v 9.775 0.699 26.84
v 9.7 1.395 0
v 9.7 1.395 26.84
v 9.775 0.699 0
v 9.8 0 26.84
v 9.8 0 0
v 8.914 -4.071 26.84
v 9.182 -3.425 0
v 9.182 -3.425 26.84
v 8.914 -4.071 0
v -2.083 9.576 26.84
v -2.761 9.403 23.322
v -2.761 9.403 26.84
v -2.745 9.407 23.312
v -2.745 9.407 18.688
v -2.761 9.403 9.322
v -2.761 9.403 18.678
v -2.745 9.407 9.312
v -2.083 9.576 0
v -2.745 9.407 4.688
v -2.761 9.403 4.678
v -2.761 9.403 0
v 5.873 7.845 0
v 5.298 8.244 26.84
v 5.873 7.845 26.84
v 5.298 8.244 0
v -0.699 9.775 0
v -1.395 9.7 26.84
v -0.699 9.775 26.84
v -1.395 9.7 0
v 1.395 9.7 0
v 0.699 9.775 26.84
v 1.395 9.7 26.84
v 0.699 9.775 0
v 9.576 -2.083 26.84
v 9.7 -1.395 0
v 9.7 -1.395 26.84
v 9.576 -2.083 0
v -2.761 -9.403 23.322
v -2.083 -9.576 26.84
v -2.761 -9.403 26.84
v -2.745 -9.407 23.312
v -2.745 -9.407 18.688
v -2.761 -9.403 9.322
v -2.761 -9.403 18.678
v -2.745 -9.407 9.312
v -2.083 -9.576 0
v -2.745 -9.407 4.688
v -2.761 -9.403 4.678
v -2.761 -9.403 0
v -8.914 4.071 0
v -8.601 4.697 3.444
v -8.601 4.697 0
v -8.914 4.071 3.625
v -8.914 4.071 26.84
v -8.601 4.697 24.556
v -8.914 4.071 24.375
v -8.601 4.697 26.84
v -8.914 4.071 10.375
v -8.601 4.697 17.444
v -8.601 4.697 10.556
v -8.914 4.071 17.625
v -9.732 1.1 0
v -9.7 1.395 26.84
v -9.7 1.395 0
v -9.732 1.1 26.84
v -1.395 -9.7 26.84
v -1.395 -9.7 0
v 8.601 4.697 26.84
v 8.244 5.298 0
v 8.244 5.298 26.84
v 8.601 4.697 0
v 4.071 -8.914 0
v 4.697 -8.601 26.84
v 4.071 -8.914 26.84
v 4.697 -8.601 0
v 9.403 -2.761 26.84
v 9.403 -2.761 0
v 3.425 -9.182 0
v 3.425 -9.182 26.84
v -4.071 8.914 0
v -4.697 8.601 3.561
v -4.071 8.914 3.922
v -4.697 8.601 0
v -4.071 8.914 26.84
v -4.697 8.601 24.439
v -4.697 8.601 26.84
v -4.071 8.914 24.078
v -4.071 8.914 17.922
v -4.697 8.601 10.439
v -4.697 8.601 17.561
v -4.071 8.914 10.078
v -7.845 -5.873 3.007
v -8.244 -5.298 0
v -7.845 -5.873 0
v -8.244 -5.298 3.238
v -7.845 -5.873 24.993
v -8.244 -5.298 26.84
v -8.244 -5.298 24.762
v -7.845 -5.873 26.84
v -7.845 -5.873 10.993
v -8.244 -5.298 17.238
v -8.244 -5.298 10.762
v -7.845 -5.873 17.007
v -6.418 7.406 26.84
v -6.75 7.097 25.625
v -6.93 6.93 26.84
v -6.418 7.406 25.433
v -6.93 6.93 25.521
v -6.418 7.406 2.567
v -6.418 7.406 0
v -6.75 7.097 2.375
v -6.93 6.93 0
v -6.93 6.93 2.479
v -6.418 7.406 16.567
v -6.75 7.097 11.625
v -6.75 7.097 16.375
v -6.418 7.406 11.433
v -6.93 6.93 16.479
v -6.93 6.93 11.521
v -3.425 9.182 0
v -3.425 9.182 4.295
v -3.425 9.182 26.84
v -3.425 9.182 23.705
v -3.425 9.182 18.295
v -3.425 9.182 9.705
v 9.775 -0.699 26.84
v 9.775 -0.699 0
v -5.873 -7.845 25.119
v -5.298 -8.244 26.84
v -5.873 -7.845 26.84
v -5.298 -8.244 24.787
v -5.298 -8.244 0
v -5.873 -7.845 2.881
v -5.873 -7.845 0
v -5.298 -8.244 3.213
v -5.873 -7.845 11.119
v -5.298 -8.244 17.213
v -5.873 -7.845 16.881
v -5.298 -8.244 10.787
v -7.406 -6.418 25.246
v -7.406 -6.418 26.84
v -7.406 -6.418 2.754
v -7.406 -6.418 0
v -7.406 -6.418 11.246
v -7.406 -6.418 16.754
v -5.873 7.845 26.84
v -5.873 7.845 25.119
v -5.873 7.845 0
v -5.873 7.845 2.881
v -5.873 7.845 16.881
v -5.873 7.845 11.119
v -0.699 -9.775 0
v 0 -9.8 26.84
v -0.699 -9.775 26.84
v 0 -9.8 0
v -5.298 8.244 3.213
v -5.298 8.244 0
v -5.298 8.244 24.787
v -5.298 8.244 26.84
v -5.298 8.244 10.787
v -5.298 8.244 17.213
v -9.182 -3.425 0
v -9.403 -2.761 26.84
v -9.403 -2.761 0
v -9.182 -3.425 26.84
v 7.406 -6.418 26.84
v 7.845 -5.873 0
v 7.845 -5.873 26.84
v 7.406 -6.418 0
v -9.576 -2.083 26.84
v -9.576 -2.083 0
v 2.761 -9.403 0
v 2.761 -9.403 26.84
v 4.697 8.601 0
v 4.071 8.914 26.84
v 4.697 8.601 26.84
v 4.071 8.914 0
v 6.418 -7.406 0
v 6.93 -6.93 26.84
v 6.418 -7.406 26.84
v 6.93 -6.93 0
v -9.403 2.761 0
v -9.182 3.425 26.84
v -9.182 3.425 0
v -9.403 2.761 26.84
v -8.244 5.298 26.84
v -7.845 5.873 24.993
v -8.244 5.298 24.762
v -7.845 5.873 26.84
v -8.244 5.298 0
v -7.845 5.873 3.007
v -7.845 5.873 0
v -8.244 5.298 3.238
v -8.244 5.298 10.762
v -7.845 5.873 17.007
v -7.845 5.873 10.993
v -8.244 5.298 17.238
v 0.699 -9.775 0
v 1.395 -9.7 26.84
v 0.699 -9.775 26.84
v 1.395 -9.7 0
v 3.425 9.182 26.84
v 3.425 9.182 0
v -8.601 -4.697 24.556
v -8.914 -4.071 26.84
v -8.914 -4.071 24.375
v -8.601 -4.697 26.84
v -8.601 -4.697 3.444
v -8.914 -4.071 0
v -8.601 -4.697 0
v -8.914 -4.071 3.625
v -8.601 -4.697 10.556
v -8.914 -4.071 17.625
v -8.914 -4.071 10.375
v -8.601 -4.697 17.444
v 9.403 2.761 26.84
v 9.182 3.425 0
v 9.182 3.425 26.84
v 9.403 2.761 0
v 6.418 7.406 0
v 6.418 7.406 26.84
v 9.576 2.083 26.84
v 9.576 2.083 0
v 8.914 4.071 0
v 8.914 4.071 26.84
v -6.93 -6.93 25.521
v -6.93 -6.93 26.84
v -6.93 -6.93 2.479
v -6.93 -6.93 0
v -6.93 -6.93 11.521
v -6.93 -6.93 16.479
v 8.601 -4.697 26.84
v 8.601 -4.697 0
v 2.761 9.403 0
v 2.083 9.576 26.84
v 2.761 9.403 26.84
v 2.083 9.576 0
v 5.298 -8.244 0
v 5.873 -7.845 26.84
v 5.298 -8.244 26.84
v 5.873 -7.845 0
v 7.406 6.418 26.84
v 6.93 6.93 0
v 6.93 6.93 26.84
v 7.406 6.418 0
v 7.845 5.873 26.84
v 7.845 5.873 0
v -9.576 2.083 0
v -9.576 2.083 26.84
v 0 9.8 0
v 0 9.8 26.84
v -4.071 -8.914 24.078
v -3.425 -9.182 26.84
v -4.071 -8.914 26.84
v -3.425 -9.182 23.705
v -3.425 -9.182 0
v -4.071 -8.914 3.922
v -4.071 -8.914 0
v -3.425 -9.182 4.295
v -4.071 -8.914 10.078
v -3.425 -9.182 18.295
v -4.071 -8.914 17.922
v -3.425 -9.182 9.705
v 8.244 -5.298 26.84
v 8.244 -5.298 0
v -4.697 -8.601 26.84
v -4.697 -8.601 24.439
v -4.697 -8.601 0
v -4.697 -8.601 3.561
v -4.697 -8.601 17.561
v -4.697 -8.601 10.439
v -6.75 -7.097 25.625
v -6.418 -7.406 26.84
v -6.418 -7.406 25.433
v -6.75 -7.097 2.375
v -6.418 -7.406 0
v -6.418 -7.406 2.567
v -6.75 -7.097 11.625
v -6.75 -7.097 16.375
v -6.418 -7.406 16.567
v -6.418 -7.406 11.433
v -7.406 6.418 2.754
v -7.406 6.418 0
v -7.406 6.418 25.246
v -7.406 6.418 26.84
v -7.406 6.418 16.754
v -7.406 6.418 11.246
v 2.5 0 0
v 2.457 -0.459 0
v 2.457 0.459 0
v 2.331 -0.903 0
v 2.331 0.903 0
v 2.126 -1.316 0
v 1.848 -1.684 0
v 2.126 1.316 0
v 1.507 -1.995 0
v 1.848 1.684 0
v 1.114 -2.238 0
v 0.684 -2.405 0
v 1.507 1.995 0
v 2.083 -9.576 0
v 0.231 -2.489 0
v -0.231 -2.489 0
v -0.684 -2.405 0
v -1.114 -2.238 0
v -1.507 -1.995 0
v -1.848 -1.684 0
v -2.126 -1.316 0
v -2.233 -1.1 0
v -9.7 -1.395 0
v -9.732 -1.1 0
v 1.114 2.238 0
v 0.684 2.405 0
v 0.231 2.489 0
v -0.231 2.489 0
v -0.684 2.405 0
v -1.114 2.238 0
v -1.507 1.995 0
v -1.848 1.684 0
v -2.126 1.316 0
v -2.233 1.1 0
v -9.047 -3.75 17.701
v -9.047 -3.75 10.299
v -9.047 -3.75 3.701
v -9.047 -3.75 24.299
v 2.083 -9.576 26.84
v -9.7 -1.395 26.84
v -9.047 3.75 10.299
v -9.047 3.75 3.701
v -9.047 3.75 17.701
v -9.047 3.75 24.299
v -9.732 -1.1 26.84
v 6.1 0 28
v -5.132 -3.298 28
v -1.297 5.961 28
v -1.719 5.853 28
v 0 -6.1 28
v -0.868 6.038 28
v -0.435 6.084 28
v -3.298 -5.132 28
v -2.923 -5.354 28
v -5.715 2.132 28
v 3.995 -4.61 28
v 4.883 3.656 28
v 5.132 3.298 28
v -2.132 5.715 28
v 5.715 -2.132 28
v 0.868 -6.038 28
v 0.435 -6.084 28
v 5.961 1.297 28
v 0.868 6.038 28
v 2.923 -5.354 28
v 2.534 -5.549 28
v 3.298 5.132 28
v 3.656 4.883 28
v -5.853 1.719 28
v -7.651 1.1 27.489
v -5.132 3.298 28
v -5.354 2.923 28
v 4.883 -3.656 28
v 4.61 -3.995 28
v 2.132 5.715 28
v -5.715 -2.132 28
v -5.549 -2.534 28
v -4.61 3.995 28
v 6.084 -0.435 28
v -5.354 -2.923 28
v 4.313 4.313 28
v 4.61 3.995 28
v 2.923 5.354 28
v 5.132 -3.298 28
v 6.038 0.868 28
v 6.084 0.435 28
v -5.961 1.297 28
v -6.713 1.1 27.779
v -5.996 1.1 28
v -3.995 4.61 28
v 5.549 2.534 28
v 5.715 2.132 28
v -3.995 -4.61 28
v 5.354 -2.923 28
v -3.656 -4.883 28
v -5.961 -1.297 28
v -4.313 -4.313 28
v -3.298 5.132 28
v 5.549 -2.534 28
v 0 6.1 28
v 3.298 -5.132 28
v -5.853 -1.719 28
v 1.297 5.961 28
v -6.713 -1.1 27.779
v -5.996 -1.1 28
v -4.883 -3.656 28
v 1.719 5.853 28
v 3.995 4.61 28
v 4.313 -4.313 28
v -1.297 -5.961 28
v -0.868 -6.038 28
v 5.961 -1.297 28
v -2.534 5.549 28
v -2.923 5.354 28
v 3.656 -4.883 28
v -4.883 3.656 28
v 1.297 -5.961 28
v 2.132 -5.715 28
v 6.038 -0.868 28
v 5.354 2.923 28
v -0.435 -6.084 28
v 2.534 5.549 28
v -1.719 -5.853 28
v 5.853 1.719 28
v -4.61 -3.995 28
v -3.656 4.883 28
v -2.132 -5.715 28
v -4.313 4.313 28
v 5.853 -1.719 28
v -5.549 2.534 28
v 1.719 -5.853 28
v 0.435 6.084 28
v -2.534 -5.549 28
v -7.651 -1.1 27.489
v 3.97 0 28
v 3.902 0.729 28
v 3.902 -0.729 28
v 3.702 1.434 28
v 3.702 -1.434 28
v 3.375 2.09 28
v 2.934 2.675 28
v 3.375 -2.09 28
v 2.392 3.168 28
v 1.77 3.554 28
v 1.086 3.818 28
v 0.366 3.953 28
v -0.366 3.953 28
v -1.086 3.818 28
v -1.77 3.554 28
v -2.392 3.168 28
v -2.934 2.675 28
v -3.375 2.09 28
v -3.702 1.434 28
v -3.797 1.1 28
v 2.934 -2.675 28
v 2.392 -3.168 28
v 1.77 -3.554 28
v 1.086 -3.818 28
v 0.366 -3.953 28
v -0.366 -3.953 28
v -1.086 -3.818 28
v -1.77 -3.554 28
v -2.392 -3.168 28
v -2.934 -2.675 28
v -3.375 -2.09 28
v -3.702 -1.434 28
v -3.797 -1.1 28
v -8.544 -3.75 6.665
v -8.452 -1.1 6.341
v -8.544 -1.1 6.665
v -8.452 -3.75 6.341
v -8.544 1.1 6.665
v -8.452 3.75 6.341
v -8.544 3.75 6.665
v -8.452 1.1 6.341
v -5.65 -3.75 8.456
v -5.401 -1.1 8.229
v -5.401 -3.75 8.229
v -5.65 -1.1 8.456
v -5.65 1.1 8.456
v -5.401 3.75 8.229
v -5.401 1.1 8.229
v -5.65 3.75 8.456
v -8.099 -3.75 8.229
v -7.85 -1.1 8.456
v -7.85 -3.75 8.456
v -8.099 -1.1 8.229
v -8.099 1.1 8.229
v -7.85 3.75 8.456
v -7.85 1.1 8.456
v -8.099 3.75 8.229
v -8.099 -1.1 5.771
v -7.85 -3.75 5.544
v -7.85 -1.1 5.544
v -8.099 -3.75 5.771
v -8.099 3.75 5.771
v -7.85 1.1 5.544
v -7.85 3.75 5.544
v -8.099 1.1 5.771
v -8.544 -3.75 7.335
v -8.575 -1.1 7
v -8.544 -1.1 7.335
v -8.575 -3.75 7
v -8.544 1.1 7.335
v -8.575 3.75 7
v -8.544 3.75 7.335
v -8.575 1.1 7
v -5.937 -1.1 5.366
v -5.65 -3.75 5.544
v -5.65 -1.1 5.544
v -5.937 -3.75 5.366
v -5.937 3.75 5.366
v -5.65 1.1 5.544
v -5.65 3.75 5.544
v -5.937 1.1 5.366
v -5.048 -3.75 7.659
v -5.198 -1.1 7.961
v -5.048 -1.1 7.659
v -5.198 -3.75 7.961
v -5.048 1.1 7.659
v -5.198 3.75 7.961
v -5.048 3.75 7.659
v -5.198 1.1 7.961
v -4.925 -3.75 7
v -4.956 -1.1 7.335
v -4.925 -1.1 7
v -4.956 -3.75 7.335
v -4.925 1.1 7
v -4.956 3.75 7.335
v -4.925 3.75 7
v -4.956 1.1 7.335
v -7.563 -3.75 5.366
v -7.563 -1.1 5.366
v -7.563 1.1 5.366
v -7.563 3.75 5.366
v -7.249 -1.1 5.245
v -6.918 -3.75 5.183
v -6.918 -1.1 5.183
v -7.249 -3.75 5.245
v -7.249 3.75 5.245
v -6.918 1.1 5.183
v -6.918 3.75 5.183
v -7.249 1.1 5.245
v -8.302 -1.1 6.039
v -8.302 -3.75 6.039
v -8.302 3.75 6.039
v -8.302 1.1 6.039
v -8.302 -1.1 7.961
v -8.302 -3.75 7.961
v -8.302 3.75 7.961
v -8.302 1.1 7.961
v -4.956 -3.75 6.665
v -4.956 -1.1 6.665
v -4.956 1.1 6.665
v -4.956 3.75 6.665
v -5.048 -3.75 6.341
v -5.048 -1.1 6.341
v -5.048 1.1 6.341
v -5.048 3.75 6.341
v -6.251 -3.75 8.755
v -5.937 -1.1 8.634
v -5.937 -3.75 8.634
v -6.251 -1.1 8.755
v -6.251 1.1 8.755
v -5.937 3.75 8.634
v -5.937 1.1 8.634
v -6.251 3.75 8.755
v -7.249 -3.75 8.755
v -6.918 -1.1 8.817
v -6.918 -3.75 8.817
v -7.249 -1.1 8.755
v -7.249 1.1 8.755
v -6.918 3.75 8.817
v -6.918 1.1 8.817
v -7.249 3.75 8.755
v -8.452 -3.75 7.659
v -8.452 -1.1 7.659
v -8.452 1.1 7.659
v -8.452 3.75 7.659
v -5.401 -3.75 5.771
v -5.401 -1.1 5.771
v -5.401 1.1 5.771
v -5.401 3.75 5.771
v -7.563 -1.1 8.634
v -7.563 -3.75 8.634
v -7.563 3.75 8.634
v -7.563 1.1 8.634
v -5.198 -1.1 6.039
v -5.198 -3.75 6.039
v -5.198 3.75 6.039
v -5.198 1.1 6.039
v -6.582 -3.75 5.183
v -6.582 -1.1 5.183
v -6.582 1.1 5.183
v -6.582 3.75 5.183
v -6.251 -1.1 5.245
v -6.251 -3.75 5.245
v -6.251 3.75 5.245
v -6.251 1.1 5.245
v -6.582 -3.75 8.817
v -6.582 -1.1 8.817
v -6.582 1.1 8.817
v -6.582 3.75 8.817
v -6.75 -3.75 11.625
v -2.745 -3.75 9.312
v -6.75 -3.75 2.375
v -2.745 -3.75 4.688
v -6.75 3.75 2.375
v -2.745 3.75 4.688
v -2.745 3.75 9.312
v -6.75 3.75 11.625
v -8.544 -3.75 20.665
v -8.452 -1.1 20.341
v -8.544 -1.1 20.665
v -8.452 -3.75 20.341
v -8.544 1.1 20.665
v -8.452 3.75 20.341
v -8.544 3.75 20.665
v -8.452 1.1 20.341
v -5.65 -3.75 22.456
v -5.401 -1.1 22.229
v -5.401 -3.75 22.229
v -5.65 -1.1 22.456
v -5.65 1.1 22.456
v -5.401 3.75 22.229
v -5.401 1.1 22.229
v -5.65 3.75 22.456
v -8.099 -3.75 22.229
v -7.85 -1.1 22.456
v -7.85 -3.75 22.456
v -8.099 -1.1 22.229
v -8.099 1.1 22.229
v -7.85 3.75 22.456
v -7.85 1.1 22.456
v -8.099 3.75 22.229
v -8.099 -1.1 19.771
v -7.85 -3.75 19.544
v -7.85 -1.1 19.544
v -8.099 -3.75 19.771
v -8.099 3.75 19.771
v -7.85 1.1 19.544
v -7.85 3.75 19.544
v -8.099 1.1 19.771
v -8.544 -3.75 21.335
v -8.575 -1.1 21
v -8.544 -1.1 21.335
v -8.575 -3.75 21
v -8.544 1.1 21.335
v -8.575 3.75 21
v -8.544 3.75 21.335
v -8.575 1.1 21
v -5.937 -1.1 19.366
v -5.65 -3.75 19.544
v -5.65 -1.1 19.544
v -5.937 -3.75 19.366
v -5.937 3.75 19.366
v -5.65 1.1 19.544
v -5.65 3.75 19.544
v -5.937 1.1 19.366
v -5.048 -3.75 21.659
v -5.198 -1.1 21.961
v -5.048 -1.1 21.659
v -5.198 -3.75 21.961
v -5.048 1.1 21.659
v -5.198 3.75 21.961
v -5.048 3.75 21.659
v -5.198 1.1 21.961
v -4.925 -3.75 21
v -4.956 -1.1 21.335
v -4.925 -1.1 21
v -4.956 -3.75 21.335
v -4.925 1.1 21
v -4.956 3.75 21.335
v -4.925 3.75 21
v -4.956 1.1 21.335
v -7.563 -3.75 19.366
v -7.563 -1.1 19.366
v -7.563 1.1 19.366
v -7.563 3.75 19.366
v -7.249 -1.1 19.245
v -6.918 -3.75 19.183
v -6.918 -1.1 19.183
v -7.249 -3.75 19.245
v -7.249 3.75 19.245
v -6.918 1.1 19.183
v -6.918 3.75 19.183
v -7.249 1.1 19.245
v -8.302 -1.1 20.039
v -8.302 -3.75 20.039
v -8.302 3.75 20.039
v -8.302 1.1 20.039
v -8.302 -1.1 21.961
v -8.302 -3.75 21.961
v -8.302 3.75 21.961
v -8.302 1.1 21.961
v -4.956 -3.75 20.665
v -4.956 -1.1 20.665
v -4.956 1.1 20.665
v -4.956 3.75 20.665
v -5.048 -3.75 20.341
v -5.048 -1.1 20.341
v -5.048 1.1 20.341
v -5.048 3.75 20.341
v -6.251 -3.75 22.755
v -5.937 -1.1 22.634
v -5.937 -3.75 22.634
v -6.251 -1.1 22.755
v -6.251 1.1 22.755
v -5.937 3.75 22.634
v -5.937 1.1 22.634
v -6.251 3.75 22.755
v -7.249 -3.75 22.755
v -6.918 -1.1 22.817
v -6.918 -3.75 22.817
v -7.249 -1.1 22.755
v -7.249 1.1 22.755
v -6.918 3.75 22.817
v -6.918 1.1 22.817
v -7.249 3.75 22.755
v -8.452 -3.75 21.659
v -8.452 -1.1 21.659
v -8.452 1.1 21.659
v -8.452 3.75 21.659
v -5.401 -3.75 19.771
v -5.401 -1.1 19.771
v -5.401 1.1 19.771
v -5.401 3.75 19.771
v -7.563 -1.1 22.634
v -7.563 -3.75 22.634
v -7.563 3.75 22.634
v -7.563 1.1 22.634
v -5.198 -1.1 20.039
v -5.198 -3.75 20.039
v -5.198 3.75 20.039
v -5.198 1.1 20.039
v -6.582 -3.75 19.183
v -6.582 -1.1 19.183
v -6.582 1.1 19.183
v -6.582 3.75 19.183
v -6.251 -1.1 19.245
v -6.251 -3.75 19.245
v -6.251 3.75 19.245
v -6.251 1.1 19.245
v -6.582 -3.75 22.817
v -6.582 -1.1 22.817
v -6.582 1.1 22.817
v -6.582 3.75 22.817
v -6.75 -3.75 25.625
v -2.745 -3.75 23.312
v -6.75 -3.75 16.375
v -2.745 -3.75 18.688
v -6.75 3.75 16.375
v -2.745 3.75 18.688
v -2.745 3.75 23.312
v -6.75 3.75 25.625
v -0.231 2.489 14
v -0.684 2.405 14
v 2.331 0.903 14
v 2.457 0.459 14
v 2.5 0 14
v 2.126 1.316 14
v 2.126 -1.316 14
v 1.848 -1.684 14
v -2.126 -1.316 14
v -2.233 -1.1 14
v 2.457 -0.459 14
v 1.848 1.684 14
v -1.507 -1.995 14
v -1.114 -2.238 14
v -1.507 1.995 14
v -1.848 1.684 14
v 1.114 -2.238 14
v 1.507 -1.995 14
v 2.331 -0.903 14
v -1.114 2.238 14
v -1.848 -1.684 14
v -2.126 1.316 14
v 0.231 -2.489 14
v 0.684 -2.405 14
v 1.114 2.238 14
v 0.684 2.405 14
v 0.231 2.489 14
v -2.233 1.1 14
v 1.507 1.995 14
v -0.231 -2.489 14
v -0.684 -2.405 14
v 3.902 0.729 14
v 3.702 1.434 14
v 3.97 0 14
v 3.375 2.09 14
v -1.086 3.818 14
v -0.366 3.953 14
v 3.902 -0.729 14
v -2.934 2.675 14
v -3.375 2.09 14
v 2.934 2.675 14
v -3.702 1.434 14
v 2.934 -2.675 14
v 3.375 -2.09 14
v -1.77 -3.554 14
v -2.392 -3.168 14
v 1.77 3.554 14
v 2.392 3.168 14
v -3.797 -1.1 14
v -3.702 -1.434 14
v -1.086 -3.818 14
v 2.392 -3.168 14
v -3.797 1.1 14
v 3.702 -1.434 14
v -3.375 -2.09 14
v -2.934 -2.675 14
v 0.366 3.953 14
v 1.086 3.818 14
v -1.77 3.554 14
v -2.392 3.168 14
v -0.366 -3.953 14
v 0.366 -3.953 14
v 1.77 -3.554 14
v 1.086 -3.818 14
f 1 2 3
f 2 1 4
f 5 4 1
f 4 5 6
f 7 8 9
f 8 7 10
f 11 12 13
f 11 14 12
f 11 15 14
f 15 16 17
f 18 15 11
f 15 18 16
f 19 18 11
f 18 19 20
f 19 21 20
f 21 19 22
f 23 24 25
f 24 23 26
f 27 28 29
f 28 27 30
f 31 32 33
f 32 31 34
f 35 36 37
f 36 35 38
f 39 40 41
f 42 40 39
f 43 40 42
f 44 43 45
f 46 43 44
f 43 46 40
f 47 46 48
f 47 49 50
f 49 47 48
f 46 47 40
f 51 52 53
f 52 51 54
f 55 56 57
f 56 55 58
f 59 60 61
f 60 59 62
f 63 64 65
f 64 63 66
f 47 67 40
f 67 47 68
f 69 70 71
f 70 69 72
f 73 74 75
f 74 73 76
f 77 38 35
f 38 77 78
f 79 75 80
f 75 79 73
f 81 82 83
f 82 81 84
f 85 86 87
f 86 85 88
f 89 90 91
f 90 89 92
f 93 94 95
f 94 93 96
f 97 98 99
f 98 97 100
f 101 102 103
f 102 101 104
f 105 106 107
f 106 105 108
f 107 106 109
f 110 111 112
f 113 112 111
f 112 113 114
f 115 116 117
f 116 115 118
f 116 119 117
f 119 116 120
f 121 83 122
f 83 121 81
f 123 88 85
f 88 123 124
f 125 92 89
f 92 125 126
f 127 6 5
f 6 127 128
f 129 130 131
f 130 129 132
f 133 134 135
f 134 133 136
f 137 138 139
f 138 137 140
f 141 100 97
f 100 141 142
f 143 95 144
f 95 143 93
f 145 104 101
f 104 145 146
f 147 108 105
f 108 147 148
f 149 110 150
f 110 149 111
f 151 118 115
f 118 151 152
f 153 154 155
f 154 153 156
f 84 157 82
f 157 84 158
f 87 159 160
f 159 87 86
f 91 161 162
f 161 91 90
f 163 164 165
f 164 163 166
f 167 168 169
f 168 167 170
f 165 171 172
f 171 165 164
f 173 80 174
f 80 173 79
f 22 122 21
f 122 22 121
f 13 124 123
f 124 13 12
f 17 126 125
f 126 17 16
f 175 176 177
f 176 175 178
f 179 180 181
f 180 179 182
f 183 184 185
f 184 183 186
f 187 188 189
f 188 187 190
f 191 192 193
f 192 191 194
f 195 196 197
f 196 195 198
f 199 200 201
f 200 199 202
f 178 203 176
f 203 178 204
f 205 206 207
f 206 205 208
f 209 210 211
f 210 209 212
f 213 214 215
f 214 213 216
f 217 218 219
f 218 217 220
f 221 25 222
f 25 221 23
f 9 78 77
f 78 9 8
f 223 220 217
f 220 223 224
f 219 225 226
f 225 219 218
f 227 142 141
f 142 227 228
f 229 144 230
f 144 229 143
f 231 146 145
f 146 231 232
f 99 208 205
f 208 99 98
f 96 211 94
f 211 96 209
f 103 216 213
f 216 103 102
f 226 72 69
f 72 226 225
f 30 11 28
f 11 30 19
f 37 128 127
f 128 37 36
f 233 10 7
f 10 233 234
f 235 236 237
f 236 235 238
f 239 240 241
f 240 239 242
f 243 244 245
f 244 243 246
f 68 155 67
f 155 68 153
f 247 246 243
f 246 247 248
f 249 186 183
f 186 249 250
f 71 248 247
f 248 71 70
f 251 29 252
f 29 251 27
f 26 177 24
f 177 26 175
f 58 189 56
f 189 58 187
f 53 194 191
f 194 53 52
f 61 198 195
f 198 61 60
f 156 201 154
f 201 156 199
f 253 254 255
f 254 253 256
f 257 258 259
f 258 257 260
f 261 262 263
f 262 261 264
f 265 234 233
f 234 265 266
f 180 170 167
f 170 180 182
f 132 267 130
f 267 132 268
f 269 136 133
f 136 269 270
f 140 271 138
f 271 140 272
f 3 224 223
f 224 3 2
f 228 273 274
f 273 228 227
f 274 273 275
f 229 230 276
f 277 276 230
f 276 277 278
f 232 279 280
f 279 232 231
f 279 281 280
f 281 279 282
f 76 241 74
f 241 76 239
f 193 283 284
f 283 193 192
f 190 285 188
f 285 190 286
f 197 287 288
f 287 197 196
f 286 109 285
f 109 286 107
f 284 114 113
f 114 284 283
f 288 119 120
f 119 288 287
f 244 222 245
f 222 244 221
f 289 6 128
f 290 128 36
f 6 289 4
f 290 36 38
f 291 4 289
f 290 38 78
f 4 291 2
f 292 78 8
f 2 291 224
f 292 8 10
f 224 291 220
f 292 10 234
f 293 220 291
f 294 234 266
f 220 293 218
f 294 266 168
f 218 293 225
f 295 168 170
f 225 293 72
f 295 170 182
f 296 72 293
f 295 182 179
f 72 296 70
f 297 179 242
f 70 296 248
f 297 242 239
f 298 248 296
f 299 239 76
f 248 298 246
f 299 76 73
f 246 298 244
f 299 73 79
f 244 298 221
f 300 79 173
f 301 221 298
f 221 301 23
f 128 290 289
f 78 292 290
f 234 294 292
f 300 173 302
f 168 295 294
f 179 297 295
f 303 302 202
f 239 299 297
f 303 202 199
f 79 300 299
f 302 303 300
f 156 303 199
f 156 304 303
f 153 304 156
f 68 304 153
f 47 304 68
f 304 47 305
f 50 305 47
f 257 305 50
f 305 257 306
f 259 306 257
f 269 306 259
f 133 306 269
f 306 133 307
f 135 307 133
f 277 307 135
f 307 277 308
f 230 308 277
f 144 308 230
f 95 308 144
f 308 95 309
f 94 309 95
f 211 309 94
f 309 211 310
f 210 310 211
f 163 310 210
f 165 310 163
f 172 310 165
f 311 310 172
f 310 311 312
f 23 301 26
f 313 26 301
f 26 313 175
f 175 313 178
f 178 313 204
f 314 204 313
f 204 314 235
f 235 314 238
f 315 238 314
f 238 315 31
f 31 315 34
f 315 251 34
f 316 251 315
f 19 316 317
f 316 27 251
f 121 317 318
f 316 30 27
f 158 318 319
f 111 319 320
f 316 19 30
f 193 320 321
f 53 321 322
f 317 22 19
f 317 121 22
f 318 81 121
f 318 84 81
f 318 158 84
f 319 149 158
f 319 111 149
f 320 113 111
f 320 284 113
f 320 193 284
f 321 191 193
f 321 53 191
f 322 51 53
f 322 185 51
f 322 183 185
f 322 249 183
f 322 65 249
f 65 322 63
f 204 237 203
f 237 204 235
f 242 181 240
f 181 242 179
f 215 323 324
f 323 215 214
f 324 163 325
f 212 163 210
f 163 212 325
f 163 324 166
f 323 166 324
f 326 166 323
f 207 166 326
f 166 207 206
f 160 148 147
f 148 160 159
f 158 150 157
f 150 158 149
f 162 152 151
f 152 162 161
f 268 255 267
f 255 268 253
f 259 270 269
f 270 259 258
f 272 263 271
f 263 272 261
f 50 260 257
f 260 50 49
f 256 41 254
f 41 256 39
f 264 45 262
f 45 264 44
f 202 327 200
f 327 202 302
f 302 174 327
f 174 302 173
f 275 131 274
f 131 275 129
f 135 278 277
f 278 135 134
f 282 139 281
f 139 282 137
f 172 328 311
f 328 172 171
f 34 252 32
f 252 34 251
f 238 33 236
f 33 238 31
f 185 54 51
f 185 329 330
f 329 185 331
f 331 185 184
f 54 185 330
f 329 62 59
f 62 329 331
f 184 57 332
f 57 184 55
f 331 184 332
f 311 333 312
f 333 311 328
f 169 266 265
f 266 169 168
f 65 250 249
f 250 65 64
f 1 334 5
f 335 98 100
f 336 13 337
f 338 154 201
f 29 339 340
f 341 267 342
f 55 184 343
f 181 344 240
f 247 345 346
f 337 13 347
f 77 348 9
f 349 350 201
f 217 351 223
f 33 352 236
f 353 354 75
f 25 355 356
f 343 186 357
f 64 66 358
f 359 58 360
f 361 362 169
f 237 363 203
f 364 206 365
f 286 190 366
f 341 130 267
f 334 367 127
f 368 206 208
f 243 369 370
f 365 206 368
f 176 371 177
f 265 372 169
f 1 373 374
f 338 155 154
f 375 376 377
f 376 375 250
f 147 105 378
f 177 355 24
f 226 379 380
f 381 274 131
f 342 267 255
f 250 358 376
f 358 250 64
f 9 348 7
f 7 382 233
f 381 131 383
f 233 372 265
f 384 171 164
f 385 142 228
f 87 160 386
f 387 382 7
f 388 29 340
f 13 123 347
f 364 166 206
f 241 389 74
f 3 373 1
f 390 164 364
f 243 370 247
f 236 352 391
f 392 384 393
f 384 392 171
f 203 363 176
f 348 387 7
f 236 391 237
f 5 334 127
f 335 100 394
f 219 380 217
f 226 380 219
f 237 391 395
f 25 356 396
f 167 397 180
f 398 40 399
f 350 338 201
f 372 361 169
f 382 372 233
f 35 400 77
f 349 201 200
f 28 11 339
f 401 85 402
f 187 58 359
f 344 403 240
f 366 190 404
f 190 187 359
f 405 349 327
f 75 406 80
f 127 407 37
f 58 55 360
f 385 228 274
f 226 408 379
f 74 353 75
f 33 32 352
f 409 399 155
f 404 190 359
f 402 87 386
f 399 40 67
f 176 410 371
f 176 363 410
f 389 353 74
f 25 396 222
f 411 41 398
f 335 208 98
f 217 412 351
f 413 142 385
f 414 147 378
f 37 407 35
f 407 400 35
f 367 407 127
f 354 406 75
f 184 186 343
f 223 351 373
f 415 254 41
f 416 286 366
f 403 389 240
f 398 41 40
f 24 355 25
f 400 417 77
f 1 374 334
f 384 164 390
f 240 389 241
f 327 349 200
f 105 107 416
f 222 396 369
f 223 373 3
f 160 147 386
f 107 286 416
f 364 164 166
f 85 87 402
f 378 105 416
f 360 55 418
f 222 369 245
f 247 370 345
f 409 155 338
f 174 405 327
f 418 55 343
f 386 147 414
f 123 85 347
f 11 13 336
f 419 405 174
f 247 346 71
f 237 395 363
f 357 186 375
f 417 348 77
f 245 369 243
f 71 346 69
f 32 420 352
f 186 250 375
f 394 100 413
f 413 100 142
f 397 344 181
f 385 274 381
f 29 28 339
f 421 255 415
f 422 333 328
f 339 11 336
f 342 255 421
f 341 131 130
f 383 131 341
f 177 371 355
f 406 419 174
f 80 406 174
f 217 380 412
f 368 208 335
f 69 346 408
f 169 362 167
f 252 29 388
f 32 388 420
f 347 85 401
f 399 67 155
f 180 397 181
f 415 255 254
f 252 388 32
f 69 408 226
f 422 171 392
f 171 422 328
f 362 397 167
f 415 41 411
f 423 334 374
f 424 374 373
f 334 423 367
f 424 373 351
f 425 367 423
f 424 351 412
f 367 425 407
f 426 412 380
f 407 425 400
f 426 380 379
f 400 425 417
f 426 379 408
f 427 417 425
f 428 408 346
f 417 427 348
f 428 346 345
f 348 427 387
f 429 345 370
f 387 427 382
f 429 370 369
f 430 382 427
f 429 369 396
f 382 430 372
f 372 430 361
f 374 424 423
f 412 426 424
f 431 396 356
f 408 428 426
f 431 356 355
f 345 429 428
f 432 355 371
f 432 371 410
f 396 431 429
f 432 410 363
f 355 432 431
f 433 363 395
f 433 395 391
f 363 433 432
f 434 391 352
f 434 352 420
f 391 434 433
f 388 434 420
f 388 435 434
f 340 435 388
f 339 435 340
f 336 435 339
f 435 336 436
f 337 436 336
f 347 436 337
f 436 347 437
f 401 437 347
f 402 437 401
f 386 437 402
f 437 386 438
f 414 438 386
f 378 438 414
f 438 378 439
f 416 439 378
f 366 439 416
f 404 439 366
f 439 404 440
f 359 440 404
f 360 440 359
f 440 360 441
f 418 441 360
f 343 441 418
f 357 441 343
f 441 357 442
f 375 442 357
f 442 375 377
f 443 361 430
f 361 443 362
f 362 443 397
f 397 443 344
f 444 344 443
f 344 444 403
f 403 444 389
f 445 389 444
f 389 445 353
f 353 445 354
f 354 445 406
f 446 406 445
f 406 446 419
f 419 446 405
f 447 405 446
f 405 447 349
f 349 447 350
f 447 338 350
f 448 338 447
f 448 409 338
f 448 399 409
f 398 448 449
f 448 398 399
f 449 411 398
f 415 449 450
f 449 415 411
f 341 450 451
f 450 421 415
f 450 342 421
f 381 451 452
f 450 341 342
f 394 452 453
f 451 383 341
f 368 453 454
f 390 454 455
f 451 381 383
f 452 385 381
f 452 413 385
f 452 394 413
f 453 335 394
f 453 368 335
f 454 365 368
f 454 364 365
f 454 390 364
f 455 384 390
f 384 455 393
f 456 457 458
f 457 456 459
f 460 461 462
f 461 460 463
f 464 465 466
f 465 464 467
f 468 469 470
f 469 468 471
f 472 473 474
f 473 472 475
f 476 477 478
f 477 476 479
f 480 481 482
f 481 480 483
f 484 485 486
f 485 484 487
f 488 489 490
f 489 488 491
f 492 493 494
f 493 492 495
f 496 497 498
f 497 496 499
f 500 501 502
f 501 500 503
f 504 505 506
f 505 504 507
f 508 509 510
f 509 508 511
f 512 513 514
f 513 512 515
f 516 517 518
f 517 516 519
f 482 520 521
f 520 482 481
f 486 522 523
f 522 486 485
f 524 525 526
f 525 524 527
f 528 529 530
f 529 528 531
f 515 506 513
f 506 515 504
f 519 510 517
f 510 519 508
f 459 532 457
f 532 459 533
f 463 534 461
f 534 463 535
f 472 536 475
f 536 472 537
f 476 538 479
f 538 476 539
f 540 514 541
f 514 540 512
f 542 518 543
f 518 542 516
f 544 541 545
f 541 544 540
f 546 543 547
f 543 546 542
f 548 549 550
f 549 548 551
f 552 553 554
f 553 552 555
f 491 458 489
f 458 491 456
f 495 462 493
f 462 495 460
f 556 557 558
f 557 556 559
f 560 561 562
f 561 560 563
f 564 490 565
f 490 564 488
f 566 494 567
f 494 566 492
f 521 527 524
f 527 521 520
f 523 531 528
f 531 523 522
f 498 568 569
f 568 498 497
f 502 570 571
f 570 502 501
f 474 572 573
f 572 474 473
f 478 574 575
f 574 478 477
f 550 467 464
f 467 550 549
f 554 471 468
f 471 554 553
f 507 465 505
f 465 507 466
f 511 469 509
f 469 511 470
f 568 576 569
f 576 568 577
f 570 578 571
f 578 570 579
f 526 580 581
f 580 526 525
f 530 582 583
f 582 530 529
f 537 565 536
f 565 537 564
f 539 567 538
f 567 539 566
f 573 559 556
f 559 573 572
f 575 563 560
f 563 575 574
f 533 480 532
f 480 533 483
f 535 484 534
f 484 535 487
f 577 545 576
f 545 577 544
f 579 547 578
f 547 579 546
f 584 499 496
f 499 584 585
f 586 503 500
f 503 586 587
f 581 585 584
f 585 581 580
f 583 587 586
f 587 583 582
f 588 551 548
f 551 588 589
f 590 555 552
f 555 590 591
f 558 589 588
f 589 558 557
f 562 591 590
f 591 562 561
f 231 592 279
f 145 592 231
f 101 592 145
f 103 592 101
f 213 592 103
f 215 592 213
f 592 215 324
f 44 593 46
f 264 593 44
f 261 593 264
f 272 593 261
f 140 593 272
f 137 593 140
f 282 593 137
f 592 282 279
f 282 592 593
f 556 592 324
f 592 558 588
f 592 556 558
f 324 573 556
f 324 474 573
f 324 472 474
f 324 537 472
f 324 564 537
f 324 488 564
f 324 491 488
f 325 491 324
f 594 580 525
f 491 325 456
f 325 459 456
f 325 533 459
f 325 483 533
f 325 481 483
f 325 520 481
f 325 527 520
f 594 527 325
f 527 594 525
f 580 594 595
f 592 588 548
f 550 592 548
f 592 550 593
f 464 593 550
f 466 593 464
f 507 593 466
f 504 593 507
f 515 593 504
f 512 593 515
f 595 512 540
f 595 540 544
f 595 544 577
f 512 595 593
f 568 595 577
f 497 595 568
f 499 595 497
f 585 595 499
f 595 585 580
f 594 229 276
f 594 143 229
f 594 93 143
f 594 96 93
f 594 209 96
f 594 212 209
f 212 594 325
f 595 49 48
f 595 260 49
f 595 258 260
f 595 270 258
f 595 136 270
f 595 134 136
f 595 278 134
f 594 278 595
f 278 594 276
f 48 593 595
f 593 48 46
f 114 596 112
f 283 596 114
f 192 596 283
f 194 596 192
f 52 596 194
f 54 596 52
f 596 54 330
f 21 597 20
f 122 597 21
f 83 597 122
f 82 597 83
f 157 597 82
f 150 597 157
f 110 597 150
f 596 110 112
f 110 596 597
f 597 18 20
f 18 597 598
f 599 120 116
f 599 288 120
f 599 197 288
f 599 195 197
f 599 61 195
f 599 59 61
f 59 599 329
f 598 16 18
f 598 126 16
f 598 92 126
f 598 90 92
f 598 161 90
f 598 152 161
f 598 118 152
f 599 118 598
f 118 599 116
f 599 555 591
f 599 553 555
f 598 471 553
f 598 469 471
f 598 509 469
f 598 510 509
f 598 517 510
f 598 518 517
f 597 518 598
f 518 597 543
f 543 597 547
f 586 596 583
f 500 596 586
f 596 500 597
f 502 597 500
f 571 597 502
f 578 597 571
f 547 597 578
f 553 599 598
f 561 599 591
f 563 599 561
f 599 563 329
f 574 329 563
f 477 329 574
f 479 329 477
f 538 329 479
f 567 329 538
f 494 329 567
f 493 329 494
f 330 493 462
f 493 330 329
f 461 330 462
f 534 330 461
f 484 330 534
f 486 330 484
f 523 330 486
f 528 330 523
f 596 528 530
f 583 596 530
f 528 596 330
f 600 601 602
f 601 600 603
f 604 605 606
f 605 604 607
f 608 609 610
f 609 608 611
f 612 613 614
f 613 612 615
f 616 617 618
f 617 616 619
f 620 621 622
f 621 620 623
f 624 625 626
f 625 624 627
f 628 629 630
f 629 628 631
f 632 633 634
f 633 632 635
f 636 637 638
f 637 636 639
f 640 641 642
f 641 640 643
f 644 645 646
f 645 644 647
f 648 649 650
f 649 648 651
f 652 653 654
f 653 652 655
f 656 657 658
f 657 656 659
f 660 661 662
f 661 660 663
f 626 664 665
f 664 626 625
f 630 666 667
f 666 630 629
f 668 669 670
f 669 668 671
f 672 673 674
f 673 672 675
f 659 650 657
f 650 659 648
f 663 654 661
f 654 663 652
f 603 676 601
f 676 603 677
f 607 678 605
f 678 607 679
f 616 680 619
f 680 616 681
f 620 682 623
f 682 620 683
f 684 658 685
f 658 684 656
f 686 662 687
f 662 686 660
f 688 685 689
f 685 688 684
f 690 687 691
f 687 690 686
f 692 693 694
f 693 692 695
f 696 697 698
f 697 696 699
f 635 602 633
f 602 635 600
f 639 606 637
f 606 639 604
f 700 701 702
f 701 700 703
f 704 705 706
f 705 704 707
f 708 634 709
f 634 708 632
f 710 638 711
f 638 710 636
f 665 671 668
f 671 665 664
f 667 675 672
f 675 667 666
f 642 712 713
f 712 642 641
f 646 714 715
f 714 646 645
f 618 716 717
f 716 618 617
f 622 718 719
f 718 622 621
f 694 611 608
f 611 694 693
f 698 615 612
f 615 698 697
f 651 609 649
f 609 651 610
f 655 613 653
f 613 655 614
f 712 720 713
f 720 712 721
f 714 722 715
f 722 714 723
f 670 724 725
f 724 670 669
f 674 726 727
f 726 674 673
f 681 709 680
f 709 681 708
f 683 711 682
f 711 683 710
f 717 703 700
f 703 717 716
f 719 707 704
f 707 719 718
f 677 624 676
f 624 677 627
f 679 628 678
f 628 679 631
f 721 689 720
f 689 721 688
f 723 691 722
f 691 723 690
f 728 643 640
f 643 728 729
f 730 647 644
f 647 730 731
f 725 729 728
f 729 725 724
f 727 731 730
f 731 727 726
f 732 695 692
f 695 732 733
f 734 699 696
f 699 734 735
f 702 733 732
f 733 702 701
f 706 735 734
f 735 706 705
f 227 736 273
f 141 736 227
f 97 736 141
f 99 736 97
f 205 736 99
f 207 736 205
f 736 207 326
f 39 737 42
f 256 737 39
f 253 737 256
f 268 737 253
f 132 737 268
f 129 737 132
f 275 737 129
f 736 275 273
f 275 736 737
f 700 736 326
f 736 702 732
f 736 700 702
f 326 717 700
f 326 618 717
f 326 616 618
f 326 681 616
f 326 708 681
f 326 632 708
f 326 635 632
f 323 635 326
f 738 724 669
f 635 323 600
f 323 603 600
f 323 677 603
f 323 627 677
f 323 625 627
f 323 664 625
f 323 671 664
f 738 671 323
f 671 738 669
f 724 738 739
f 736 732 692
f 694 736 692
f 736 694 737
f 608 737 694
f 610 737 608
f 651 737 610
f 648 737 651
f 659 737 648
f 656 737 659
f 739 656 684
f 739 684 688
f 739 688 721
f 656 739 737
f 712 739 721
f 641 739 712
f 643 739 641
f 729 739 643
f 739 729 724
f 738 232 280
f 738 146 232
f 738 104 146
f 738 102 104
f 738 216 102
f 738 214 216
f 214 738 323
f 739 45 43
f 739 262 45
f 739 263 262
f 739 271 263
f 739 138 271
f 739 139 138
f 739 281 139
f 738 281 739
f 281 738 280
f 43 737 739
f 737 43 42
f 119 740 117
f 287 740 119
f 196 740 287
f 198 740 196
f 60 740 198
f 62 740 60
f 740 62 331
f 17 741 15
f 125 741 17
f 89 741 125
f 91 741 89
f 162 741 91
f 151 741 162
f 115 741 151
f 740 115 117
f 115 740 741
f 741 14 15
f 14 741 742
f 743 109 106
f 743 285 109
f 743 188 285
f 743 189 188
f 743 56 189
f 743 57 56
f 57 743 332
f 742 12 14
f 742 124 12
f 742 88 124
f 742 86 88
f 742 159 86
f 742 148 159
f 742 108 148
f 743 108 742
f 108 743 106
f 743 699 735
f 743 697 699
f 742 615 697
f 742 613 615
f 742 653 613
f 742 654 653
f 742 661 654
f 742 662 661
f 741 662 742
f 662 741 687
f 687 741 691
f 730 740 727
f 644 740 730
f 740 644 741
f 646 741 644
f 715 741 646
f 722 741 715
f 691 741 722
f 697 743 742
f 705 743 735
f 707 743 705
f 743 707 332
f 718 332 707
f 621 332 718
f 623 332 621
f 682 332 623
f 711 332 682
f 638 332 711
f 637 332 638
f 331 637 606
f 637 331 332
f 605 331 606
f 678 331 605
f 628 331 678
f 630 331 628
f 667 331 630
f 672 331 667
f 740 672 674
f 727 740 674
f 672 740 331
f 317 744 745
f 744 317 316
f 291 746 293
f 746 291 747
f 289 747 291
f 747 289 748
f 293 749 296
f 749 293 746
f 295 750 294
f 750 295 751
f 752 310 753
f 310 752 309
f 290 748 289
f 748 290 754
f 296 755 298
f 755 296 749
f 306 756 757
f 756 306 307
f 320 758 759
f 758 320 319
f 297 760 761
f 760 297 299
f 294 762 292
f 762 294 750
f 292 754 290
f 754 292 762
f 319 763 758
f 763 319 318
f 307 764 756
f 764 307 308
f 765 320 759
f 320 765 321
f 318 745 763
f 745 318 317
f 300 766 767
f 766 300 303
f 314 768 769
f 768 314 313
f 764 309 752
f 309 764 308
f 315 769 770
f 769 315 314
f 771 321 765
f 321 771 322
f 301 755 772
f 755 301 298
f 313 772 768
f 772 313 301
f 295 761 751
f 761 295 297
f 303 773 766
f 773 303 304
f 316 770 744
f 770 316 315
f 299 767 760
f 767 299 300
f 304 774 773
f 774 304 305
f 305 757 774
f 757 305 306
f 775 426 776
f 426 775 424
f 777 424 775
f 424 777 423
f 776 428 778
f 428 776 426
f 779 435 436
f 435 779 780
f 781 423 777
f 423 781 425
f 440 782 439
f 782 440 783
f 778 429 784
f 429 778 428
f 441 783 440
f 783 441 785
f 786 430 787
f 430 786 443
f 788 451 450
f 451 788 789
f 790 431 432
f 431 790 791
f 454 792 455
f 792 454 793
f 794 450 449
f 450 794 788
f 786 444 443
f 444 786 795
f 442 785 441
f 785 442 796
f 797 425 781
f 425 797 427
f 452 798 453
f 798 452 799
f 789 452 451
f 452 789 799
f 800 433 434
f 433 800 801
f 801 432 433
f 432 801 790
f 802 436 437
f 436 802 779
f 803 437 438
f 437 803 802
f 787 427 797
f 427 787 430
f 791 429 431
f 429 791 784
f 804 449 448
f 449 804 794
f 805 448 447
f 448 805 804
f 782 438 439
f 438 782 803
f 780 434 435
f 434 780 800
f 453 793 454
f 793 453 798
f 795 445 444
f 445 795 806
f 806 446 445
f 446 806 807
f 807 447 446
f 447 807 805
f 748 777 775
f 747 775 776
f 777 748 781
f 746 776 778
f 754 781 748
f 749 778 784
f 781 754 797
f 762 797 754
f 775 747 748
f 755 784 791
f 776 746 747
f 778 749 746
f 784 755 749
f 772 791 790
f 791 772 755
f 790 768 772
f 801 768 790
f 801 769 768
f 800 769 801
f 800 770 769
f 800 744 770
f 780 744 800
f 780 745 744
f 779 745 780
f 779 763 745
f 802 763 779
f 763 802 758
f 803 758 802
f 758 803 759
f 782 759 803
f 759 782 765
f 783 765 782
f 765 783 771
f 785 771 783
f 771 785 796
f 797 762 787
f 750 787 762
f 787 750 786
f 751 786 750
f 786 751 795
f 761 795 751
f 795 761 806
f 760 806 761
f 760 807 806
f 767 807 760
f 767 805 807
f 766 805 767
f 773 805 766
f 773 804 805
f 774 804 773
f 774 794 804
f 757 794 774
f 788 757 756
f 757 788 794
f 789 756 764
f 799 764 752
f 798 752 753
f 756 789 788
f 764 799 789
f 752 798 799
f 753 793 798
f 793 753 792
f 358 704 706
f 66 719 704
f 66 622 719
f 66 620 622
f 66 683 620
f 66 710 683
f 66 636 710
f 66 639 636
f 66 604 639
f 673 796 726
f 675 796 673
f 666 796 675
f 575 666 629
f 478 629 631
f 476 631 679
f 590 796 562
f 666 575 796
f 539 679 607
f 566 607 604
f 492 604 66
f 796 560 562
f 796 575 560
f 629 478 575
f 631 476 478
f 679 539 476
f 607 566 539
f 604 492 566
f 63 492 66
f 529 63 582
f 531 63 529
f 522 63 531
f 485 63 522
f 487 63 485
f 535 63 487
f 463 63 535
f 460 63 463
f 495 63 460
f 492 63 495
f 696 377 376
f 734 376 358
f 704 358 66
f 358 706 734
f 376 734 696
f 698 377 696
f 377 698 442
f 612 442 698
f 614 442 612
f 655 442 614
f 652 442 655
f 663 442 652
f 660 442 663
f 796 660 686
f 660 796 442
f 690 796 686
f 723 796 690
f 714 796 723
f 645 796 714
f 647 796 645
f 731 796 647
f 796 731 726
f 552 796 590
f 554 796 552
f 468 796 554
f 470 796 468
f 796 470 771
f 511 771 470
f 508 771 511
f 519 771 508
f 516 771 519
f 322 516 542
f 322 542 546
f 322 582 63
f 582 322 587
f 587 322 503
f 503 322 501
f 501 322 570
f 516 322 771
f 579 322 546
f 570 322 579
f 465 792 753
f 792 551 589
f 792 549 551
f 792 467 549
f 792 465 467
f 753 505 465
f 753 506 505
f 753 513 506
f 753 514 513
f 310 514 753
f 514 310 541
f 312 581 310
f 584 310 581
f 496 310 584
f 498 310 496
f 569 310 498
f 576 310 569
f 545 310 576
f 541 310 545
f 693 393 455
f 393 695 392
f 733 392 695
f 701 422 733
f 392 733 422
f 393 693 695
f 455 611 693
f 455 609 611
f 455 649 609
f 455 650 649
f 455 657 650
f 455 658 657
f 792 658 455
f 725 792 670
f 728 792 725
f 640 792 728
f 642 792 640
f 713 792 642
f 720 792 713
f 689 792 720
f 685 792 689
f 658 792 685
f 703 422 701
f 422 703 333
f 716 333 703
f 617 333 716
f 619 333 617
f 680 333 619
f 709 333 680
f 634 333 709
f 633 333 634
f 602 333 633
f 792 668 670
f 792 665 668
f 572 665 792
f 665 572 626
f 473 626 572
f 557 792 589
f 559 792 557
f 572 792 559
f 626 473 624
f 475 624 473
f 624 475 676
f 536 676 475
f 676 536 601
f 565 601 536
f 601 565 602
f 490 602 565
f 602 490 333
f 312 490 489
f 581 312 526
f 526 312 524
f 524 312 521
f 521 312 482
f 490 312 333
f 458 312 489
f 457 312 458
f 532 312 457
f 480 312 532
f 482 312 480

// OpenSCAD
//Parametric Rigid Coupler
//By David Bunch 8/9/2015
//
//This design is based on the Rigid Coupler for the
//Mostly printed CNC machine http://www.thingiverse.com/thing:724999
//To couple a Nema 17 Motor shaft to a 5/16" threaded rod
//I only changed the connection diameter of the 5/16" threaded rod
//The little bolts used to tighten this design are #6 x 1/2" bolts
//If using metric, M4 x 14mm is closest
//CUSTOMIZER VARIABLES

//1. Outside Diameter of Coupler
OD = 19.6;

//2. Taper Height for Coupler
H2 = 1.16;

//3. Taper Outside Diameter of Coupler
ODT = 12.2;

//4. Total Height of Coupler
Ht = 28.0;

//5. Small Coupler Connection
M5 = 5.0;

//6. Large Coupler Connection
M8 = 7.94;                   //Originally 7.6mm (5/16" = 7.9375mm)

//7. Gap Cut size for Tightening Coupler
GapDist = 2.2;

//8. Coupling Bolt Diameter used for Tightening (#6 screw used here)
M4 = 3.65;              //Use 4.0 if using M4 bolts

//9. Coupling Bolt Diameter used for Tightening (#6 Nut default)
M4Nut = 9.25;           //if using M4 nuts, use 8.08mm

//10. Bolt Length (1/2" long bolt is default)
BoltLen = 12.7;         //This should still be a good length for
                        //14mm or 16mm length bolts,
                        //they will just stick out a little beyond locknut

//11. X Offset for Bolt Tightening Holes
M4_DX = 6.75;

//12. 1st Z Offset for Bolt Tightening Holes
M4_DZ1 = 7.0;

//13. 2nd Z Offset for Bolt Tightening Holes
M4_DZ2 = 21.0;

//14. Resolution large Circles
IresBig = 88;

//15. Resolution of Small Circles
IresSmall = 34;

//16. 1 part or 2 Halves
PartType = 1;   //2 Halves are useful if your 2 shafts are already in place
                //This maybe useful if you need to replace a broken coupling
                //without removing Z tower

//CUSTOMIZER VARIABLES END

M4_Thk = (BoltLen - GapDist - 5.2) / 2;
echo("M4_Thk = ", M4_Thk);

echo("H2 = ",H2);
H1 = Ht - H2;
echo("H1 = ",H1);

GapHalf = GapDist / 2;
M4Nut_DY = M4_Thk + GapHalf;

Rad = OD / 2;
//Draw the Main Coupler
module DrawUnion()
{
    union()
    {
        cylinder(d=OD,h=H1,$fn=IresBig);
        translate([0,0,H1])
        cylinder(d1=OD,d2=ODT,h=H2,$fn=IresBig);
    }
}
module HorizontalHoles()
{
    translate([0,0,M4_DZ1])
    BoltAndNutCut();            //Lower Horizontal Hole
    translate([0,0,M4_DZ2])
    BoltAndNutCut();            //Upper Horizontal Hole
}
//Cut out the holes, gap & draw final part
module DrawFinal()
{
    difference()
    {
        DrawUnion();
        translate([0,0,-1])
        cylinder(d=M5,h=Ht+2,$fn=IresSmall);
        translate([0,0,Ht / 2])
        cylinder(d=M8,h=Ht,$fn=IresSmall);
        translate([-(Rad+.01),-GapHalf,-1])
        cube([Rad,GapDist,Ht+2]);       //Cut gap for tightening
//Cut bottom bolt tightening hole
        HorizontalHoles(); 
        if (PartType == 2)
        {
            rotate([0,0,180])
            {
                HorizontalHoles();  //Cut horizontal holes for tightening bolts
                translate([-(Rad+.01),-GapHalf,-1])
                cube([Rad,GapDist,Ht+2]);       //Cut gap for tightening
            }
        }
    }
}
//These are the holes for the tightening bolts & nuts
module BoltAndNutCut()
{
//Drill hole all the way through
    translate([-M4_DX,Rad,0])
    rotate([90,0,0])
    cylinder(d=M4,h=OD,$fn=IresSmall);
//Cut for hex nut on one end
    translate([-M4_DX,-M4Nut_DY,0])
    rotate([90,0,0])
    rotate([0,0,30])
    cylinder(d=M4Nut,h=Rad,$fn=6); 
//Cut for hex nut on the other end
    translate([-M4_DX,M4Nut_DY,0])
    rotate([-90,0,0])
    rotate([0,0,30])
    cylinder(d=M4Nut,h=Rad,$fn=6);
}
DrawFinal();
